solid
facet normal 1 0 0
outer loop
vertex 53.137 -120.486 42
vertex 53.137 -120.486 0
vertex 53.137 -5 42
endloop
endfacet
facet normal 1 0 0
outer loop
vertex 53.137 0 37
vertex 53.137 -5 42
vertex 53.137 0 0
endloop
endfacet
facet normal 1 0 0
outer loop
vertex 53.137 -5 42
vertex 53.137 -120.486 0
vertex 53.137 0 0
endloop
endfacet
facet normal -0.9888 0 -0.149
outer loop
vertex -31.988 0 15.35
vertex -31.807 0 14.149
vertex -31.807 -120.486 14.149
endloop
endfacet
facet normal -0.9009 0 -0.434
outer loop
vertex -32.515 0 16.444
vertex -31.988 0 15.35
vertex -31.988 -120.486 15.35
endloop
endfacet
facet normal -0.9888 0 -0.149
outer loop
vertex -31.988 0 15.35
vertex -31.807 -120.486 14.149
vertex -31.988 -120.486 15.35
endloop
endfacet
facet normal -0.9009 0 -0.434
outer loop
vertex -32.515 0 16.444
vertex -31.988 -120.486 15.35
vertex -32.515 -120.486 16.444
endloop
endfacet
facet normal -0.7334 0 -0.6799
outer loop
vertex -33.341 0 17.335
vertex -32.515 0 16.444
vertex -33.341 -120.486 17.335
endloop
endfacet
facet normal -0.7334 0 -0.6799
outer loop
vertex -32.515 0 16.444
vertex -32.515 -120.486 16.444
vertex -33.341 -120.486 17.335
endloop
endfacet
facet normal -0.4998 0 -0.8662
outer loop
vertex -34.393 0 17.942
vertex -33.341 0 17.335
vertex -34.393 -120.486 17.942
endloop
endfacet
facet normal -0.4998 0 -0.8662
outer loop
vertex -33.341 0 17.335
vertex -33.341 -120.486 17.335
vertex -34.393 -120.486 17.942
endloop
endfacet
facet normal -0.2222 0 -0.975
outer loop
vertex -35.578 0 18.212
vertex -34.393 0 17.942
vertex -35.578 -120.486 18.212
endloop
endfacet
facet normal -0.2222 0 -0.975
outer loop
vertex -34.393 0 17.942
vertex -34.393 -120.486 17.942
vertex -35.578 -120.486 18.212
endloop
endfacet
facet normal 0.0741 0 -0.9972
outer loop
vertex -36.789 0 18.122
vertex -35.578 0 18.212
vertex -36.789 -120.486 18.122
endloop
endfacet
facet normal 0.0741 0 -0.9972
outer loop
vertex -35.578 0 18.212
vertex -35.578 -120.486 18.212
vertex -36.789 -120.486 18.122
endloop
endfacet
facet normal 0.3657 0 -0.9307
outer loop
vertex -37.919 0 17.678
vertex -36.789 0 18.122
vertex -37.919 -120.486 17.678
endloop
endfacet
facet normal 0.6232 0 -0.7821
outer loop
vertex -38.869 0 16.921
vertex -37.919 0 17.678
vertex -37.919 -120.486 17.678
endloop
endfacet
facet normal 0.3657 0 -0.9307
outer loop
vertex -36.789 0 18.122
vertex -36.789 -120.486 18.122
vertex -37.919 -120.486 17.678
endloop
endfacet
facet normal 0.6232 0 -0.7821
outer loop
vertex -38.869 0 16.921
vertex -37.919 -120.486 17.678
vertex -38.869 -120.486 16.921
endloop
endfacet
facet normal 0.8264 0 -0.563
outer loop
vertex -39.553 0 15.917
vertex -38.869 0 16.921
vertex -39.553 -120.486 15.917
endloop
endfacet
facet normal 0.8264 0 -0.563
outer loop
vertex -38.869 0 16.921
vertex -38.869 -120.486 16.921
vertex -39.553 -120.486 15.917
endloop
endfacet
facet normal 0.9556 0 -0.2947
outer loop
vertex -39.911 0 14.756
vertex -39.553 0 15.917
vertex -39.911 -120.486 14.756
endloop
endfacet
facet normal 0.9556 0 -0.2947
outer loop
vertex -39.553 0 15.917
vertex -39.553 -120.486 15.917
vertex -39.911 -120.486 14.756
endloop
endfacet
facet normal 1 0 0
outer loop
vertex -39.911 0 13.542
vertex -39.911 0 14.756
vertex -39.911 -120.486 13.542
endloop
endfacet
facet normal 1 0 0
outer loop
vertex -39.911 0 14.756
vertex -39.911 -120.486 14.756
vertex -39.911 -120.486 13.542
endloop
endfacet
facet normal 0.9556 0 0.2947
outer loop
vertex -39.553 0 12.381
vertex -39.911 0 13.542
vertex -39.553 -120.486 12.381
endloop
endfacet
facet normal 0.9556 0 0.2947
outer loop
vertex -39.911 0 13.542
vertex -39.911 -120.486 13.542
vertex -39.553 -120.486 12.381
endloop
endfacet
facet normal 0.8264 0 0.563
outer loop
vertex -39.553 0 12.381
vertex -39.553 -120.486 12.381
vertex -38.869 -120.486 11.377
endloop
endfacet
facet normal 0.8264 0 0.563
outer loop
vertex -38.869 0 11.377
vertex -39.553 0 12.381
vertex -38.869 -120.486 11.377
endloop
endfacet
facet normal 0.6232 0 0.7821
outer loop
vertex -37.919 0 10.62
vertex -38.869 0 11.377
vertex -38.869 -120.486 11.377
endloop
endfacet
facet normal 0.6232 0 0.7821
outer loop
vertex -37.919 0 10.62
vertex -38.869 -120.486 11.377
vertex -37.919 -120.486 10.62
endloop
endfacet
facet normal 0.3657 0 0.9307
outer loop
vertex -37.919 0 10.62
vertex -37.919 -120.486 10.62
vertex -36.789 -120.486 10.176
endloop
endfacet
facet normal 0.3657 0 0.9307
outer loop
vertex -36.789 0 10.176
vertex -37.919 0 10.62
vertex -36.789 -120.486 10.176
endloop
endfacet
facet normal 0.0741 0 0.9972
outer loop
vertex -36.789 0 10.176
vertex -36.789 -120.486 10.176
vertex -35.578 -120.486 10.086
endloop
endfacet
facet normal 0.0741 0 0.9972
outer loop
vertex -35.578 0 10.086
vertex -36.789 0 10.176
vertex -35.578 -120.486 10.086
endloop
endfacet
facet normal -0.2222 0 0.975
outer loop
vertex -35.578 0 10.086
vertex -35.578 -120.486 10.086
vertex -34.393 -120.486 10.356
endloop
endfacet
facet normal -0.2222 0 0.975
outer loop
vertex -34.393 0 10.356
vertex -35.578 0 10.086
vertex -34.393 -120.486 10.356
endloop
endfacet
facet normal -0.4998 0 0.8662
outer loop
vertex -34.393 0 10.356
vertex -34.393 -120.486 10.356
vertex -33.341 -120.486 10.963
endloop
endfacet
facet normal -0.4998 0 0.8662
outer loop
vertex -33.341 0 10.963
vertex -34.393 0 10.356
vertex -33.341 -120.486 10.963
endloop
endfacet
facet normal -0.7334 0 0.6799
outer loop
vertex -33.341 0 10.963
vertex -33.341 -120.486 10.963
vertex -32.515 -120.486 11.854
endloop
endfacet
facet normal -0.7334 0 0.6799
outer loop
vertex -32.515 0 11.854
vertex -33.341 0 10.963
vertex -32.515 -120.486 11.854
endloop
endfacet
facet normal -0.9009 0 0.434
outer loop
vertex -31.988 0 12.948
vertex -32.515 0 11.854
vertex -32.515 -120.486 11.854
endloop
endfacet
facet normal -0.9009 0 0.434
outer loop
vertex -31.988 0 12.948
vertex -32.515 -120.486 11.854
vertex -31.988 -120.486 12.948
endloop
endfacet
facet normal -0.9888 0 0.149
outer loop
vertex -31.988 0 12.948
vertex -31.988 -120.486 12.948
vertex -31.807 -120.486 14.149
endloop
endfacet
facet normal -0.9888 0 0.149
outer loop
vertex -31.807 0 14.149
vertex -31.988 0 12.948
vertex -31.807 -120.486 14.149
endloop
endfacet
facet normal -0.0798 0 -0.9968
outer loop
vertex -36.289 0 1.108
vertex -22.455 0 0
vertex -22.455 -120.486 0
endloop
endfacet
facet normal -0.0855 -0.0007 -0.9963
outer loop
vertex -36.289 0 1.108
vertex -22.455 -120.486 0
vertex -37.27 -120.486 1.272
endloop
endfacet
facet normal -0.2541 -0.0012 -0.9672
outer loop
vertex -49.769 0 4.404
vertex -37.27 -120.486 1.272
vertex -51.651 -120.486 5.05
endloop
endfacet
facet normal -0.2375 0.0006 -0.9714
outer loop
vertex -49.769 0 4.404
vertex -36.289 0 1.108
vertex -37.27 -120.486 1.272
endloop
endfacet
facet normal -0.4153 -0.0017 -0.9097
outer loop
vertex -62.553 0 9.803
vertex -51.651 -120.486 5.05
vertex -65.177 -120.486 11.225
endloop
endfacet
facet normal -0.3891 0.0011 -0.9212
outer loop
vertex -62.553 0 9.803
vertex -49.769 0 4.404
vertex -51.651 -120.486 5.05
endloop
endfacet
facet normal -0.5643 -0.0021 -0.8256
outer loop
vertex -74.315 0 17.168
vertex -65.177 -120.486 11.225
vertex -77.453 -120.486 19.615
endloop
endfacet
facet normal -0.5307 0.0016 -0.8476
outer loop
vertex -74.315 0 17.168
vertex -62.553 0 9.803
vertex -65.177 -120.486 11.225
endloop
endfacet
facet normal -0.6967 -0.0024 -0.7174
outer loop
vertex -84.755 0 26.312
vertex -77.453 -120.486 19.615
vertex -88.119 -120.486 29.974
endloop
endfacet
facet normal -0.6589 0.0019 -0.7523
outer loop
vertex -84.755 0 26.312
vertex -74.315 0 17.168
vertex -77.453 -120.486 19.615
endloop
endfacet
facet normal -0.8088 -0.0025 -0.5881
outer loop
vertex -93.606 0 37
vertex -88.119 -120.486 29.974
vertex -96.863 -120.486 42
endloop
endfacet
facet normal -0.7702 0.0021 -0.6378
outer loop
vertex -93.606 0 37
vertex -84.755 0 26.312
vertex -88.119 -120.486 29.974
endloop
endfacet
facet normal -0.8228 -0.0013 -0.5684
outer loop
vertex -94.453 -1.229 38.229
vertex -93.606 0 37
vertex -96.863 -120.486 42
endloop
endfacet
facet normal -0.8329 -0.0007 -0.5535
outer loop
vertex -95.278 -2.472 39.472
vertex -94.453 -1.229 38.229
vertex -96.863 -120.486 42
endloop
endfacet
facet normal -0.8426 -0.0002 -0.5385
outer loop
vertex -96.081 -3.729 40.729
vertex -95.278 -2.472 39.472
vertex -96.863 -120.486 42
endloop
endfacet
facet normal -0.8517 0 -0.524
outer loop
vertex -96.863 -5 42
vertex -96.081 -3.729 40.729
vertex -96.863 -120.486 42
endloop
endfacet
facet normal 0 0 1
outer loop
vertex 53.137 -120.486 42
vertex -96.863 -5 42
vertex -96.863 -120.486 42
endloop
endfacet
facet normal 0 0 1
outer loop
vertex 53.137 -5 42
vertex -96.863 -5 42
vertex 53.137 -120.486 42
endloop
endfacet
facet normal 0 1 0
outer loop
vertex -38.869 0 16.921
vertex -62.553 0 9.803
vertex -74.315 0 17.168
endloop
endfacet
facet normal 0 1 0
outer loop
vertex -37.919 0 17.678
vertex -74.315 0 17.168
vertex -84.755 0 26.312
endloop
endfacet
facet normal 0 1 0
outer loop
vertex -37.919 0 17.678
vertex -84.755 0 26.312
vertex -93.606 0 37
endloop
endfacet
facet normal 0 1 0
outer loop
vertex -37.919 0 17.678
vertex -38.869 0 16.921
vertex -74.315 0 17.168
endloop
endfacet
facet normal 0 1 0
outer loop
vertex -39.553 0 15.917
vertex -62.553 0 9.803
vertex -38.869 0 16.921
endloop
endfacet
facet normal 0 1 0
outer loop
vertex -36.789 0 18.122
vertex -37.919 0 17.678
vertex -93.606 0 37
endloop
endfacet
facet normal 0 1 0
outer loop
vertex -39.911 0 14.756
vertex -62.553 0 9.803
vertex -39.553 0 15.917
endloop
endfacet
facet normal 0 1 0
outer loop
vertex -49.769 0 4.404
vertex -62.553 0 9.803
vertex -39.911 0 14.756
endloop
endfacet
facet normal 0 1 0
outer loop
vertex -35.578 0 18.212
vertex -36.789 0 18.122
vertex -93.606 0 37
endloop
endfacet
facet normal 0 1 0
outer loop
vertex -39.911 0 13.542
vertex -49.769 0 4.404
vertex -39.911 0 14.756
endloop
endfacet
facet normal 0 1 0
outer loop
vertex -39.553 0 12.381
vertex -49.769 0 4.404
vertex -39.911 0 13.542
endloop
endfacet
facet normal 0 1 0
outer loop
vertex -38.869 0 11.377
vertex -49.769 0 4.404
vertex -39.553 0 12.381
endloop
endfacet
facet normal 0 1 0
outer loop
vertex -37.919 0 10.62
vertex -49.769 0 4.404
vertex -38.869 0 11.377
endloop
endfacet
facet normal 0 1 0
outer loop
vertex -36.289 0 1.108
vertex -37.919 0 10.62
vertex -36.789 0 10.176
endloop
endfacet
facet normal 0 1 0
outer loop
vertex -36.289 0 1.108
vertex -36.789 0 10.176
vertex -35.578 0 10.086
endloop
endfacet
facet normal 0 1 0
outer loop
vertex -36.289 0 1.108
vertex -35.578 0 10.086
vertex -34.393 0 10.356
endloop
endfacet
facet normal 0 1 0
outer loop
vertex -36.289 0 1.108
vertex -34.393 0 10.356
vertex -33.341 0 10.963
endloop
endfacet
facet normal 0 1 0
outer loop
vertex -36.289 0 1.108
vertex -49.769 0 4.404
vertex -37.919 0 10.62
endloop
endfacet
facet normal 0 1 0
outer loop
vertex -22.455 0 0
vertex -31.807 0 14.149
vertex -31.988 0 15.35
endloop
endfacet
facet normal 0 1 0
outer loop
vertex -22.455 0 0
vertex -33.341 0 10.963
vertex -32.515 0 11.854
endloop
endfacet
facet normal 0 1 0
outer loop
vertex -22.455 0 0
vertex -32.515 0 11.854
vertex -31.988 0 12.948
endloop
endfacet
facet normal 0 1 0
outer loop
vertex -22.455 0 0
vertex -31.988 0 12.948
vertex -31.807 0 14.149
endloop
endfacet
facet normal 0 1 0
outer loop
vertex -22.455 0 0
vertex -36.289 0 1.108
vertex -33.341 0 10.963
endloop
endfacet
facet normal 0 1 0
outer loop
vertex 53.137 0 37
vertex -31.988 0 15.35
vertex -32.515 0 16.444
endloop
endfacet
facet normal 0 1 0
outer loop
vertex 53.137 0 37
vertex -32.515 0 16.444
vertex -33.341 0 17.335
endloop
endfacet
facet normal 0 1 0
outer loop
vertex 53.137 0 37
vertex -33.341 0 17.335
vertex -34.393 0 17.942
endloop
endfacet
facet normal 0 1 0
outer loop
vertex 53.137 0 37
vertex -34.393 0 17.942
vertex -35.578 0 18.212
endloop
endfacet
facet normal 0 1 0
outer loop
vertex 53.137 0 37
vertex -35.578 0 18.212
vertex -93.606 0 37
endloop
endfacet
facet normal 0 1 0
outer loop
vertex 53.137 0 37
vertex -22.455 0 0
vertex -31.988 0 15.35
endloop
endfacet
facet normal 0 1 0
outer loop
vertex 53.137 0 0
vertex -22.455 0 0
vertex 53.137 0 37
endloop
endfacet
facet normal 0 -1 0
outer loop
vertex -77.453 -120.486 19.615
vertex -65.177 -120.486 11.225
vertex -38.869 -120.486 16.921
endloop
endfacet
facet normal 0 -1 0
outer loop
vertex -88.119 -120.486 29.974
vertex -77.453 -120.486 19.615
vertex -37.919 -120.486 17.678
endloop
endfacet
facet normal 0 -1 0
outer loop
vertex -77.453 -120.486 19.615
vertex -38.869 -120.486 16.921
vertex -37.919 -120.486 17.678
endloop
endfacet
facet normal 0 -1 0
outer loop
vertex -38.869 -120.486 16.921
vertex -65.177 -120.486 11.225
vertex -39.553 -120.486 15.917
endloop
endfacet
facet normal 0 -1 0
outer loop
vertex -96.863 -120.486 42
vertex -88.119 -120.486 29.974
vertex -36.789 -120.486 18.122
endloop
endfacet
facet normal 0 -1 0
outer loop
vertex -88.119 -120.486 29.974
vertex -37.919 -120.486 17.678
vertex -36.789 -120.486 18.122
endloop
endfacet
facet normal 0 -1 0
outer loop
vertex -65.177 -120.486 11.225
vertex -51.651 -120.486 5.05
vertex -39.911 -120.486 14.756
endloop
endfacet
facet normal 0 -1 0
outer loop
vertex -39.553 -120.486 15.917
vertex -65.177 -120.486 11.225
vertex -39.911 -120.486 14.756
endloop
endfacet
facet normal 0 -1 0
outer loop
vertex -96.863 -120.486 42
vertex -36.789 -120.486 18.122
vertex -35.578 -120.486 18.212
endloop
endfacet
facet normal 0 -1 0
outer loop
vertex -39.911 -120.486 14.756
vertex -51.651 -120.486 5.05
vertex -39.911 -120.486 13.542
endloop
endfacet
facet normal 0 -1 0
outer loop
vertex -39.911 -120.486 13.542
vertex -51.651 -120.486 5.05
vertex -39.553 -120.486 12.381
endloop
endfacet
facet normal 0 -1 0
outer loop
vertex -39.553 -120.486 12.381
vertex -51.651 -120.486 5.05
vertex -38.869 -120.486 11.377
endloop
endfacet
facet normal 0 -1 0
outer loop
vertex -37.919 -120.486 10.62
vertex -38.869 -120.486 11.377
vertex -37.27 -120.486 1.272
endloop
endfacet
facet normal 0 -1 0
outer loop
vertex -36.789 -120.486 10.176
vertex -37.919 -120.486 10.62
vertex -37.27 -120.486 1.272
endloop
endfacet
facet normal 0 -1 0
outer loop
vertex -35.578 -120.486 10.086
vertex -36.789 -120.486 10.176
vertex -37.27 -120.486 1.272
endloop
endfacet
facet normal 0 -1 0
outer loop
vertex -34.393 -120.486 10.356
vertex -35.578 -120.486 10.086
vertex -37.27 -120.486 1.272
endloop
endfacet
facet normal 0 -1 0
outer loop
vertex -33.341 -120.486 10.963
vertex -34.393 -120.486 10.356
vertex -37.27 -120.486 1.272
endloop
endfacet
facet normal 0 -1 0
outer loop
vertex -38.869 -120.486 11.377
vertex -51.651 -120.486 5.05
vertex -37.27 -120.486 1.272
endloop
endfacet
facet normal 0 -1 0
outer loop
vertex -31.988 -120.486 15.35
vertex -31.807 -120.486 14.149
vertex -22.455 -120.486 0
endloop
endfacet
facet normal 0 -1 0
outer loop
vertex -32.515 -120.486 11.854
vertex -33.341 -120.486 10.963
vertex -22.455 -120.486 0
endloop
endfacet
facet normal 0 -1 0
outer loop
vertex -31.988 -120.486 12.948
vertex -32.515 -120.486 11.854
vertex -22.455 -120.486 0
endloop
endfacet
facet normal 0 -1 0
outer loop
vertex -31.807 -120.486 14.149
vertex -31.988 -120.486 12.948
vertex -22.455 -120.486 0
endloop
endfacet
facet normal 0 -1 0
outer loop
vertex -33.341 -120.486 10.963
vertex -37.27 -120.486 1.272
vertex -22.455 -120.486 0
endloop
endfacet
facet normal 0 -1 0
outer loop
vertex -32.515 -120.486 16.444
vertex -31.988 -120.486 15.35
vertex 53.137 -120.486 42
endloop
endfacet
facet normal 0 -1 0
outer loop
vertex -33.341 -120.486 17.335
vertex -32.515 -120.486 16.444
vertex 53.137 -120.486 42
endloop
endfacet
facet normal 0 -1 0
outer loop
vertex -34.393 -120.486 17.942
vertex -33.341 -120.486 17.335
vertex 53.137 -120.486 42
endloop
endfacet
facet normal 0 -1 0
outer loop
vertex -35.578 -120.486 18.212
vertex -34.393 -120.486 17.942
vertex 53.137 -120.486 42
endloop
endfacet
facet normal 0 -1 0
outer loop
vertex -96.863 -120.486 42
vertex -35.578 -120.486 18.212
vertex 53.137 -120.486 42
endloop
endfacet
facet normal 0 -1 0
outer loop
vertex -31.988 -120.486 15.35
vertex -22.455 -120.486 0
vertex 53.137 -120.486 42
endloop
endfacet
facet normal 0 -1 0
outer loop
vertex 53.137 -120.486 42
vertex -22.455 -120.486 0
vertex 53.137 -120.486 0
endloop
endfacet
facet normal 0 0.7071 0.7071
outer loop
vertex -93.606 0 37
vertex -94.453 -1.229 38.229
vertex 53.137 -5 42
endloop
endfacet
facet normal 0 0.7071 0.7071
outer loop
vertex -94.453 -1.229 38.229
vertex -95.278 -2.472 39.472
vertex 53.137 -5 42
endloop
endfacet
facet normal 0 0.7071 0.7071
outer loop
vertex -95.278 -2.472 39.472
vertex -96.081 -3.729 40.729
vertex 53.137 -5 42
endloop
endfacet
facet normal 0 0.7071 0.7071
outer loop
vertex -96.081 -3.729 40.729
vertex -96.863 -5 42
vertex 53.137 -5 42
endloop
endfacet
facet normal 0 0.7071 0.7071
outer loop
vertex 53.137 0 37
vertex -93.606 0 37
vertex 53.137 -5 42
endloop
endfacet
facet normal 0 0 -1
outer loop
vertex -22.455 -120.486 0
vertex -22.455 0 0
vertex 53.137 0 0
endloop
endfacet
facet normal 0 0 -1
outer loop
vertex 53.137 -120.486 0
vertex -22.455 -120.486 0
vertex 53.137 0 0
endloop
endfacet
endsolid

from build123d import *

# Parameters (mm, degrees)
F0_W        = 150
F0_H        = 120.4859416558
F1_DEPTH    = 42
F2_SIZE     = 5
F3_T1_DEPTH = 492.526994922
F6_R        = 4.0747978112
F7_DEPTH    = 192


# Not quite as in the source:
# - a fillet or chamfer that OpenCascade refuses, or shapes differently, is made with other operations: its cross-section is extruded or revolved along the edge and cut away or added
# - the program builds the solid bodies; features that only make, move or delete a surface that nothing else refers to are left out


with BuildPart() as f1:
    # F0 (on Top) → F1 (new body)
    with BuildSketch(Plane.XY):
        with Locations((-21.8634653855, -60.2429708279)):
            Rectangle(F0_W, F0_H)
    extrude(amount=F1_DEPTH)

    # F2
    f2_edges = [f1.edges().sort_by_distance(p)[0] for p in [
        (-21.863465, 0, 42),
    ]]
    chamfer(f2_edges, length=F2_SIZE)

    # F3: fillet of radius 86.9116882454 on 1 edges, made by hand

    # F3_s2 → F3_t1 (cut)
    with BuildSketch(Plane.XZ.offset(-186.0205266331)):
        with BuildLine():
            ThreePointArc((-22.4552547323, 0), (-65.1769758253, 11.2248591368), (-96.8634653855, 42))
            Line((-96.8634653855, 42), (-96.8634653855, 0))
            Line((-96.8634653855, 0), (-22.4552547323, 0))
        make_face()
    extrude(amount=F3_T1_DEPTH, mode=Mode.SUBTRACT)

    # F6 (on face) → F7 (cut)
    with BuildSketch(Plane.XZ.offset(120.4859416558)):
        with Locations((-35.8820706606, 14.1489794478)):
            Circle(F6_R)
    extrude(amount=-F7_DEPTH, mode=Mode.SUBTRACT)


solid = f1.part
